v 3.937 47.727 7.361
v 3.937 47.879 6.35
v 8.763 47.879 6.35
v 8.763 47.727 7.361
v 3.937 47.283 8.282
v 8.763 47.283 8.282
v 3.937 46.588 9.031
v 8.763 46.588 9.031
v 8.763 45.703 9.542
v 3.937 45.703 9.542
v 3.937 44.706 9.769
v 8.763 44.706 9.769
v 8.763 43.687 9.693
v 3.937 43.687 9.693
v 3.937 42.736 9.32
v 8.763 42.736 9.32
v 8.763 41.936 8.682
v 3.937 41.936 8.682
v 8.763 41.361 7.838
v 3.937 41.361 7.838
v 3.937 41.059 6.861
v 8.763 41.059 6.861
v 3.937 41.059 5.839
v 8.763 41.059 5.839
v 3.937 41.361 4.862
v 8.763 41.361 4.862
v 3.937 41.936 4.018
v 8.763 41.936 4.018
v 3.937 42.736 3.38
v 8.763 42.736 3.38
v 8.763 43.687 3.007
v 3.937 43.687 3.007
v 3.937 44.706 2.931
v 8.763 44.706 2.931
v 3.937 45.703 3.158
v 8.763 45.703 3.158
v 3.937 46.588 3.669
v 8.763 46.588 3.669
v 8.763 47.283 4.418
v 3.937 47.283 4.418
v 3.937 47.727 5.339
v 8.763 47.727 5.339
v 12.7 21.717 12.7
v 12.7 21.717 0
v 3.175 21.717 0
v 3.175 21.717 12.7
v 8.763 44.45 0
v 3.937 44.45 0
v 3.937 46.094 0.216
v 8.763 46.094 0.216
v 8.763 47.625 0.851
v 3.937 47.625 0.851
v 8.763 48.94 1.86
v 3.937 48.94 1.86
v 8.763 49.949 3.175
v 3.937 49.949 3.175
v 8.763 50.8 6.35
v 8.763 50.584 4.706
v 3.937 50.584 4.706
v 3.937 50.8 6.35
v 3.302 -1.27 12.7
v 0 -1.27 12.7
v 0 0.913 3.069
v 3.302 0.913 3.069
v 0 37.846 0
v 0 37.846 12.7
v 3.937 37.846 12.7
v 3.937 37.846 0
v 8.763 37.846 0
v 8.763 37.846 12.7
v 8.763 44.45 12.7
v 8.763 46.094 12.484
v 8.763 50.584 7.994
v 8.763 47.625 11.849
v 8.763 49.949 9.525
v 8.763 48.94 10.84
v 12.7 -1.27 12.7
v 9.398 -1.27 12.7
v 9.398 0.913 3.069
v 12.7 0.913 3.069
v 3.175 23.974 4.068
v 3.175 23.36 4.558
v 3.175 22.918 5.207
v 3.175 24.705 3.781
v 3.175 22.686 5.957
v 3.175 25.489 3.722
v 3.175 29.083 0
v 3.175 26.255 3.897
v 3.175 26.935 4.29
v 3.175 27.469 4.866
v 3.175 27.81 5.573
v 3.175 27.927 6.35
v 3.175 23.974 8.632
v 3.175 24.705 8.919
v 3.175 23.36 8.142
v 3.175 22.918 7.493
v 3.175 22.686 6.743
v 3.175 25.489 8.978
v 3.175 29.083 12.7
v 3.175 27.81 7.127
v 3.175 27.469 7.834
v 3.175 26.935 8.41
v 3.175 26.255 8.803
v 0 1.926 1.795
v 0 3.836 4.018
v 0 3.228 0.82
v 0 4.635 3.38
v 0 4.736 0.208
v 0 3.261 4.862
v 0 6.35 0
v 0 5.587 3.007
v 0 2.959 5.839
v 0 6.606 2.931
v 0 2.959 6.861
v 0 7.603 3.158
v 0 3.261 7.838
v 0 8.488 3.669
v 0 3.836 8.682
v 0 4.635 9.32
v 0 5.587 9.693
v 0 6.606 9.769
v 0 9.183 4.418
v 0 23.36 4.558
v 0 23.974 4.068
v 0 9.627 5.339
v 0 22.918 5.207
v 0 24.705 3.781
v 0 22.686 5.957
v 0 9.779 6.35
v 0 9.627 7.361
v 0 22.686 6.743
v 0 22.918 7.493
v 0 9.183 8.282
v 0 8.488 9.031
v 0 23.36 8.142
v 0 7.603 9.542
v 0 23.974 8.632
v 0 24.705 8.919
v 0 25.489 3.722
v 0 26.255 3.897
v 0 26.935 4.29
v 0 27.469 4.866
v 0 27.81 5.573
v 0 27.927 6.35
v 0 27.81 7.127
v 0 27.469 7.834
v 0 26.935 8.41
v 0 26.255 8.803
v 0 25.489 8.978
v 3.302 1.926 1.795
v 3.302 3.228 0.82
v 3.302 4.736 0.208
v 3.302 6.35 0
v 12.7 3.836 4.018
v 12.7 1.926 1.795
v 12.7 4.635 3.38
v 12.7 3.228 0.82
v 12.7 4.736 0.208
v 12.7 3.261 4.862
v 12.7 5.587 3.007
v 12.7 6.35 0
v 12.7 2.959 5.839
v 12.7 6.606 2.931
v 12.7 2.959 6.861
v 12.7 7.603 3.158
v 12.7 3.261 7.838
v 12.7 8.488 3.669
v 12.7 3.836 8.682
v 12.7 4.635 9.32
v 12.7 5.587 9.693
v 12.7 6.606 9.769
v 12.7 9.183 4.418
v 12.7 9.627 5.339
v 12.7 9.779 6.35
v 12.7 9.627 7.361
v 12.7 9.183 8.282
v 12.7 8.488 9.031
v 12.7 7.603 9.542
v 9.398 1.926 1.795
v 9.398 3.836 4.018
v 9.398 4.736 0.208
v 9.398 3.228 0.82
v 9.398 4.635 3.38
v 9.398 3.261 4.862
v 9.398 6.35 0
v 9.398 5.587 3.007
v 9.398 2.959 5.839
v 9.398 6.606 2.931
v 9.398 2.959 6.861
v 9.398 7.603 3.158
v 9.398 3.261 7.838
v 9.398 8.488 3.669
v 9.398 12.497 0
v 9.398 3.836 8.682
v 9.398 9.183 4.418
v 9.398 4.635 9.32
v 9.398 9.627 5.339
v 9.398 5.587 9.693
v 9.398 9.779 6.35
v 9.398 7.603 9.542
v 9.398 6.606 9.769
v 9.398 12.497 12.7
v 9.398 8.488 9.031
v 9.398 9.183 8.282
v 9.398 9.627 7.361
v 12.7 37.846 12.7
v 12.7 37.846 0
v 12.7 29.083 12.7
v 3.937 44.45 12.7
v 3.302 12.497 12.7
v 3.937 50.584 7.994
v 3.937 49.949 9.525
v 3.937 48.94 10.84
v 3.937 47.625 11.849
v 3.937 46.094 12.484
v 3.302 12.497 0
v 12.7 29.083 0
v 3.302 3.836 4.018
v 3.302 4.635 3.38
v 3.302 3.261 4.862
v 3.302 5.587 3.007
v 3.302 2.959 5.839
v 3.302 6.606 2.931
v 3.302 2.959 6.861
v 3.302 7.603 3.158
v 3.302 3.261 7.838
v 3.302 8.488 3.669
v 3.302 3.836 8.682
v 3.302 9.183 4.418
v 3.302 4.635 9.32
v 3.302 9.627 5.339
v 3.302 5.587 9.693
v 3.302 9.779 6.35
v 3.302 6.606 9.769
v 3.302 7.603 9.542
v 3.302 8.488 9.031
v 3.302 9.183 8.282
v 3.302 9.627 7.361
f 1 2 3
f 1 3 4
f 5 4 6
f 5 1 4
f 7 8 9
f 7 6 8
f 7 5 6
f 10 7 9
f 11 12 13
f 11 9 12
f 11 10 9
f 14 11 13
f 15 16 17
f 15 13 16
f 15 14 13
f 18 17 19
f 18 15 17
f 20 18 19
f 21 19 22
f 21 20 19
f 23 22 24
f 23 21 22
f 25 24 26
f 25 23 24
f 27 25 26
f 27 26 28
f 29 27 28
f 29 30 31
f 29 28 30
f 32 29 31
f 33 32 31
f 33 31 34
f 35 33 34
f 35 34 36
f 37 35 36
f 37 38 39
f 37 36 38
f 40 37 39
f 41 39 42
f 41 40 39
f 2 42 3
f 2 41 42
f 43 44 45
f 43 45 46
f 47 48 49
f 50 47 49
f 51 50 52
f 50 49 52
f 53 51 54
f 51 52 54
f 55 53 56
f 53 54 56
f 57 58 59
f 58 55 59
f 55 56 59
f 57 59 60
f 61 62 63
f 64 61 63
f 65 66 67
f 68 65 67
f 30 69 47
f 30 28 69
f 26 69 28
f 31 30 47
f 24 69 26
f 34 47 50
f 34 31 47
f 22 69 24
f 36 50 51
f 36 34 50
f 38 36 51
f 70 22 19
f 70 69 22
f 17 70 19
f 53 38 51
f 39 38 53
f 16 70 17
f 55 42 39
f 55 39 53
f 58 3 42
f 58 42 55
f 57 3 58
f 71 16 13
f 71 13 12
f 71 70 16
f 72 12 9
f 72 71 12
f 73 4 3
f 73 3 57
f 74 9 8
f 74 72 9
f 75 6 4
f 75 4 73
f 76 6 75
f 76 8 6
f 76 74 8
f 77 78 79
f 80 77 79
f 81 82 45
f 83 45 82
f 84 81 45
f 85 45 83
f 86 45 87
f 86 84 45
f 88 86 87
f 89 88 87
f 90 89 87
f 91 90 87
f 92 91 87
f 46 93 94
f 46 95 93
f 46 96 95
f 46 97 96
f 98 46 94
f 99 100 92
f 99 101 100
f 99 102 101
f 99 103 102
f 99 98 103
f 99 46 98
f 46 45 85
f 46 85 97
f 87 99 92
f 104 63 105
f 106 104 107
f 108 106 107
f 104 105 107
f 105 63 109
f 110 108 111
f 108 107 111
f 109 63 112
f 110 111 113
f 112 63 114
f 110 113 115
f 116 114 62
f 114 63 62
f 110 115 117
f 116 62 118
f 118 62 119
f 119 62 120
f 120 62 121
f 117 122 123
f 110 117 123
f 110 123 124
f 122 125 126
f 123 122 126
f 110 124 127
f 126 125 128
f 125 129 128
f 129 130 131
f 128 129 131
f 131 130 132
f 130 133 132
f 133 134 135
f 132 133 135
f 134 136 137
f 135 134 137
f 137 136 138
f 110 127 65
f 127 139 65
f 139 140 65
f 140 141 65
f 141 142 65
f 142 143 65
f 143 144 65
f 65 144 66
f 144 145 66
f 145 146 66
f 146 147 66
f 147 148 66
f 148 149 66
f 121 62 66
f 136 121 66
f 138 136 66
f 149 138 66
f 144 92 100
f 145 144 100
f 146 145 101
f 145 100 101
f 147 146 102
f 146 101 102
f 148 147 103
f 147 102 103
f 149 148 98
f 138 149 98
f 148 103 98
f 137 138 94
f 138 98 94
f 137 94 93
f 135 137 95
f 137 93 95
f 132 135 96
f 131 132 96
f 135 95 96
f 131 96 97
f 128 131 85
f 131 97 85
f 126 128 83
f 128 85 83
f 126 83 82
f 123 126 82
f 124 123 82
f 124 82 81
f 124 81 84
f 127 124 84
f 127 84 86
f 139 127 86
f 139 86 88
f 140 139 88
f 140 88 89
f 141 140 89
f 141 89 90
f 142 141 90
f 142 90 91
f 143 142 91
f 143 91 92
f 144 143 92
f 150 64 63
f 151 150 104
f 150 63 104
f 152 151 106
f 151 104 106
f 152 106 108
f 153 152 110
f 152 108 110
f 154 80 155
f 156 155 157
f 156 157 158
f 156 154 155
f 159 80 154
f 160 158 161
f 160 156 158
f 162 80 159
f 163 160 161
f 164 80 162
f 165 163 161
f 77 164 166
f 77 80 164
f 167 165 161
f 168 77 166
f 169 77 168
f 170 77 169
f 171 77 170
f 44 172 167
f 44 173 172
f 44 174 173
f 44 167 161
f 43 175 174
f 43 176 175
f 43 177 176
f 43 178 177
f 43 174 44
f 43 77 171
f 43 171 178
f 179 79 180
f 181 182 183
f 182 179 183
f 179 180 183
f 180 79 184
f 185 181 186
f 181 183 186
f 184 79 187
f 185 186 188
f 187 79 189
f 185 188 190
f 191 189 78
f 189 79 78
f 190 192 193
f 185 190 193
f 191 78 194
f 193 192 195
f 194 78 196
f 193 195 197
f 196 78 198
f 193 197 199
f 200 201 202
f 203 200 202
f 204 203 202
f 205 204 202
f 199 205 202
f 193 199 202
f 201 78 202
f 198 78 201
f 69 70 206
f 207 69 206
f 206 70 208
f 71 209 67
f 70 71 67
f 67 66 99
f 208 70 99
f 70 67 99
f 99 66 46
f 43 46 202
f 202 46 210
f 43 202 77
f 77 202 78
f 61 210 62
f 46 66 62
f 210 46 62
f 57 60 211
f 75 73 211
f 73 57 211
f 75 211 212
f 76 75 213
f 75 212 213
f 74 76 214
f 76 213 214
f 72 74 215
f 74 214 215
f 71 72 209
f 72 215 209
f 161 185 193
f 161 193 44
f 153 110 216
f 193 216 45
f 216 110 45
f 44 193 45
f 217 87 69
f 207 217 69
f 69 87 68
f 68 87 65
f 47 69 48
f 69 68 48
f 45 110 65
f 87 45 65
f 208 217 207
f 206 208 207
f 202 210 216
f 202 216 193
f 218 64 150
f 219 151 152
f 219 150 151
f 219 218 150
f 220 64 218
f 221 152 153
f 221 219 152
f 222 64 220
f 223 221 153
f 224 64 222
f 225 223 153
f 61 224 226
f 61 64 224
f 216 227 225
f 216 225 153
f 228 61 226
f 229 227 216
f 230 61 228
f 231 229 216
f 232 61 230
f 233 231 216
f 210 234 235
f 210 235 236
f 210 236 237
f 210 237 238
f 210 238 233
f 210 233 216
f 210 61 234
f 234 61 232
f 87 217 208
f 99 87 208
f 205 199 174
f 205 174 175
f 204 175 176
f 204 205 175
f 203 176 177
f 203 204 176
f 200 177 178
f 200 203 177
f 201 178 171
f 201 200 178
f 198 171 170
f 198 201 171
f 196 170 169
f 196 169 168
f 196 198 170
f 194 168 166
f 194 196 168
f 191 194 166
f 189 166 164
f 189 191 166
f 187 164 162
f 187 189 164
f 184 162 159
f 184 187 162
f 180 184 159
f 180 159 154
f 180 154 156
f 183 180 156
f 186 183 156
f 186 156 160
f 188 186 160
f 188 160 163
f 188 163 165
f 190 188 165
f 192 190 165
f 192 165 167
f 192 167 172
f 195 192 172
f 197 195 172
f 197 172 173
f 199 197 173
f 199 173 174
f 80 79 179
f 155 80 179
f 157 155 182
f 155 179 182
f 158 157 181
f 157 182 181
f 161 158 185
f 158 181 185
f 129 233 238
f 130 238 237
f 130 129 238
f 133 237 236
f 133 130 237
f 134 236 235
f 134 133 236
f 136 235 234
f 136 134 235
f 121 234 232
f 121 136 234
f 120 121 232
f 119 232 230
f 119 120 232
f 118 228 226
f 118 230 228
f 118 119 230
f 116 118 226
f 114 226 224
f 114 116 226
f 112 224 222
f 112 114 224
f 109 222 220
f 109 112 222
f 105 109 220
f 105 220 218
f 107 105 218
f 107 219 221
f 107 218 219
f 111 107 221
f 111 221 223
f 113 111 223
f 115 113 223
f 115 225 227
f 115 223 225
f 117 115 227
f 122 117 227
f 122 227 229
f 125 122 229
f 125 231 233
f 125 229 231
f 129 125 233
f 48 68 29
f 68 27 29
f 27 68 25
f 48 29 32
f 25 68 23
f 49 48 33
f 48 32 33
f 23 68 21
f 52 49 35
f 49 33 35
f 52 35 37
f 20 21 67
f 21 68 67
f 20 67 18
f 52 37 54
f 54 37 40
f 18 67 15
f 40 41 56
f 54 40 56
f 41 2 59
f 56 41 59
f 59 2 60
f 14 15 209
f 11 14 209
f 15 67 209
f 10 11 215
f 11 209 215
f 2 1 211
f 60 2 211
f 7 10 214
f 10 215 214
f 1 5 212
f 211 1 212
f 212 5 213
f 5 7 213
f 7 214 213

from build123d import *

# Parameters (mm, degrees)
F0_R     = 3.429
F1_DEPTH = 12.7
F2_W     = 6.096
F2_H     = 21.723506
F2_W_2   = 3.937
F2_H_2   = 13.240079
F3_DEPTH = 25.4
F4_W     = 7.366
F4_H     = 12.7
F5_DEPTH = 9.525
F6_R     = 2.63525
F7_DEPTH = 25.4


with BuildPart() as f1:
    # F0 (on Right) → F1 (new body)
    with BuildSketch(Plane.YZ):
        with BuildLine():
            ThreePointArc((0.913208, 3.069178), (3.228359, 0.820275), (6.35, 0))
            Line((6.35, 0), (44.45, 0))
            ThreePointArc((44.45, 0), (48.940128, 1.859872), (50.8, 6.35))
            ThreePointArc((50.8, 6.35), (48.940128, 10.840128), (44.45, 12.7))
            Line((44.45, 12.7), (0, 12.7))
            Line((0, 12.7), (-1.27, 12.7))
            Line((-1.27, 12.7), (0.913208, 3.069178))
        make_face()
        with Locations((6.35, 6.35)):
            Circle(F0_R, mode=Mode.SUBTRACT)
        with Locations((44.45, 6.35)):
            Circle(F0_R, mode=Mode.SUBTRACT)
    extrude(amount=F1_DEPTH)

    # F2 (on face) → F3 (cut)
    with BuildSketch(Plane.XY.offset(12.7)):
        with Locations((6.35, 1.635321)):
            Rectangle(F2_W, F2_H)
        with Locations((1.9685, 44.466039)):
            Rectangle(F2_W_2, F2_H_2)
        with Locations((10.7315, 44.466039)):
            Rectangle(F2_W_2, F2_H_2)
    extrude(amount=-F3_DEPTH, mode=Mode.SUBTRACT)

    # F4 (on face) → F5 (cut)
    with BuildSketch(Plane.YZ.offset(12.7)):
        with Locations((25.4, 6.35)):
            Rectangle(F4_W, F4_H)
    extrude(amount=-F5_DEPTH, mode=Mode.SUBTRACT)

    # F6 (on face) → F7 (cut)
    with BuildSketch(Plane.YZ.offset(3.175)):
        with Locations((25.291821, 6.35)):
            Circle(F6_R)
    extrude(amount=-F7_DEPTH, mode=Mode.SUBTRACT)


solid = f1.part
